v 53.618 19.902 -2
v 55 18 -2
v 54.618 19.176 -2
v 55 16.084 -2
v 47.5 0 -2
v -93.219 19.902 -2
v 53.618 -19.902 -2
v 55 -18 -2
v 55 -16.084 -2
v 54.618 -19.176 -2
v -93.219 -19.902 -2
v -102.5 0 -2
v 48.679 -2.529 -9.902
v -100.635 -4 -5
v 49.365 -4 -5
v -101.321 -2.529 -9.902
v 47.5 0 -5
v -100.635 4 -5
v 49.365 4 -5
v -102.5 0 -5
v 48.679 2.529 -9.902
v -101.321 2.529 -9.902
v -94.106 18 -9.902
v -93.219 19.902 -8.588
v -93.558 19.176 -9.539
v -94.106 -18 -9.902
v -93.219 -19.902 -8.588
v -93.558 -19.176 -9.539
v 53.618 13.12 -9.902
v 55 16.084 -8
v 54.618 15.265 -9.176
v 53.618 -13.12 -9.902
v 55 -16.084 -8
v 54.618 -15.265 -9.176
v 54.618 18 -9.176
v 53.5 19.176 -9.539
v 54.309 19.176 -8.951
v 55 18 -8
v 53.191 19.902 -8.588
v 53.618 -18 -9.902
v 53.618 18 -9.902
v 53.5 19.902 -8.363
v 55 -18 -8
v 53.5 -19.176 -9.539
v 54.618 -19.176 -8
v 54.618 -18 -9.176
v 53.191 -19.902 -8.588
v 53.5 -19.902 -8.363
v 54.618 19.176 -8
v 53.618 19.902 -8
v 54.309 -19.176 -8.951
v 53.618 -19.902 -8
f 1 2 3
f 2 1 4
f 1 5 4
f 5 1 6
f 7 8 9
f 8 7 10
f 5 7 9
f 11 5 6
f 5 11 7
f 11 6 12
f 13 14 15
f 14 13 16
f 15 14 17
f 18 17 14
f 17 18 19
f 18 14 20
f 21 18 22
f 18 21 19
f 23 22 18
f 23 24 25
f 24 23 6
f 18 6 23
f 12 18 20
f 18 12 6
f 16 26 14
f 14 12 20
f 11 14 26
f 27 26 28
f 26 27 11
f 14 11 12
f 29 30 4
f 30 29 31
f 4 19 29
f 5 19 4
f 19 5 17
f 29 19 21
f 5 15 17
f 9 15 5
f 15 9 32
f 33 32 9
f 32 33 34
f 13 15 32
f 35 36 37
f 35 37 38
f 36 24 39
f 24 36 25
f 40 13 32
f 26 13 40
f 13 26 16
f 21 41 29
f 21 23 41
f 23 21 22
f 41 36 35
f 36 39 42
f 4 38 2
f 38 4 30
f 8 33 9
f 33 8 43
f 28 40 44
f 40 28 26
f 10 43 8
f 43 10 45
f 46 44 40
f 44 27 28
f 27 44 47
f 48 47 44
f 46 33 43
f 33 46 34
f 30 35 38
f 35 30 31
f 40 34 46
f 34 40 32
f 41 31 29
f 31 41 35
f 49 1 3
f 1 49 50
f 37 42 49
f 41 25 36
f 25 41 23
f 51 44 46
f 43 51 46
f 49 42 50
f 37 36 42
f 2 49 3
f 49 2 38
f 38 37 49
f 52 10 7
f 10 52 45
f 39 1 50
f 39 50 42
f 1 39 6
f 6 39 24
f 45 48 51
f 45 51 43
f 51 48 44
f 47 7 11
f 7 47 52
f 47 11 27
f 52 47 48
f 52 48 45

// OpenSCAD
// file: globals.scad
/*
Most things in this file is represented as one millimeter, so keep that in mind while changing things.
Some of the setting are not mm but at variables that you can set, such as 2*x=2x and you are setting what x is.
I will try to specify when things are variables and not exact measurements.
*/

obj_leg = 30;
leg_length = 5.5;
small_number = 0.001;
metal_core_rode_global = 5;


///////////////// number of holes /////////////////////
z_hole_number = 8;
other_holes = 8;

///////////////// Pins /////////////////////

//pins that poke out
ball_size = 10;
pin_height = 20;
pin_diameter = 6;


//holes
hole_ball_size = ball_size;
hole_pin_height = pin_height;
hole_pin_diameter = pin_diameter;

///////////////// Z THINGS /////////////////////

berring_slot_width = 7.5;
berring_slot_depth = 6.5;
metal_core_rode = 5;

///////////////// X THINGS /////////////////////

//male dove tails
max_width=8;
min_width=5;
depth=5;
height=obj_leg/2;

//female dove tails, this is found on the y mounts
girl_max_width=11;
girl_min_width=5;
girl_depth=5;
girl_height=obj_leg;


///////////////// Y THINGS /////////////////////
/*
The Y is so normal that all of those global variables at the top should change all of the setting in it, this section is set her incase there are variables set in the future development of this project.
*/
// file: include.scad
//////////////////      END SECTION       //////////////////

	module added_pins(){
		difference(){
			union(){
				translate([30/(15/4),obj_leg*leg_length,30/(15/4)]) pin();
				translate([30/(15/4)+14.5,obj_leg*leg_length,30/(15/4)+14]) pin();
			}
			union(){
							translate([30/(15/4)+13.5,obj_leg*leg_length-20,30/(15/4)+5])cube(size=[2,40,15]);
							translate([30/(15/4)+7.5,obj_leg*leg_length-20,30/(15/4)+15])rotate([0,90,0]) cube(size=[2,40,15]);	

							translate([30/(15/4)-1,obj_leg*leg_length-20,30/(15/4)-8])cube(size=[2,40,15]);
							translate([30/(15/4)-10,obj_leg*leg_length-20,30/(15/4)+1])rotate([0,90,0]) cube(size=[2,40,15]);
			}
		}
	}
	module taken_pins() {
		translate([30/(15/4)+14,obj_leg*leg_length-10,30/(15/4)]) mirror_pin();
		translate([30/(15/4),obj_leg*leg_length-10,30/(15/4)+15]) mirror_pin();
	}


//////////////////      OTHER STUFF       //////////////////

	module holes() {
		rotate([0,0,90]) for(y=[0:other_holes])
		translate([obj_leg+y*15,-15.5,7.5]) union() {
			translate([7.5,0,15]) hole_up();
			hole_down();
		}
	}
	module extend_holes() {
	module top(){
		rotate([0,0,90]) for(y=[0:other_holes+1])
		translate([(30/4)+y*15,-15.5,7.5]) union() {
			translate([7.5,0,15]) hole_up();
		}
	}
	module bottom(){
		rotate([0,0,90]) for(y=[0:other_holes+2])
		translate([(30/4)+y*15,-15.5,7.5]) union() {
			hole_down();
		
}
	}
	union(){
		top();
		bottom();
	}
	}

	module hole() {
		union() {
			rotate([90, 90, 0]) cylinder(h=40, d=hole_pin_diameter, center=true);
			translate([0,7.5,0]) sphere(d=hole_ball_size);
			translate([0,-6,0]) sphere(d=hole_ball_size);
		}
	}
	module hole_up() {
		union() {
			rotate([90, 90, 0]) cylinder(h=40, d=hole_pin_diameter, center=true);
			translate([0,7.5,10]) cylinder(h=hole_pin_height, d=hole_pin_diameter, center=true);
			translate([0,-6,10]) cylinder(h=hole_pin_height, d=hole_pin_diameter, center=true);
			translate([0,7.5,0]) sphere(d=hole_ball_size);
			translate([0,-6,0]) sphere(d=hole_ball_size);
		}
	}
	module hole_down() {
		union() {
			rotate([90, 90, 0]) cylinder(h=40, d=hole_pin_diameter, center=true);
			translate([0,7.5,-10]) cylinder(h=hole_pin_height, d=hole_pin_diameter, center=true);
			translate([0,-6,-10]) cylinder(h=hole_pin_height, d=hole_pin_diameter, center=true);
			translate([0,7.5,0]) sphere(d=hole_ball_size);
			translate([0,-6,0]) sphere(d=hole_ball_size);
		}
	}
	module pin() {
		union() {
			rotate([90, 90, 0]) cylinder(h=pin_height, d=pin_diameter, center=true);
			translate([0,7.5,0]) sphere(d=ball_size);
		}
	}

	module mirror_pin() {
		rotate([90, 90, 0]) cylinder(h=hole_pin_height+small_number, d=hole_pin_diameter, center=true);
		translate([0,-(pin_height-(ball_size/2)),0]) sphere(d=ball_size);
	}


//////////////////      SOME RACK AND Z THINGS       //////////////////

module z_holes() {
    rotate([0,-90,0]) for(z=[0:z_hole_number])
    translate([22.5+z*15,16,-12])
        hole();
}

module pin_cuts() {
	union(){
		cube(size=[2,10,40], center=true);
		rotate([0,0,90]) cube(size=[2,10,40], center=true);
	}
}
module pin_uncut() {
	union(){
		rotate([0, 0, 90]) cylinder(h=hole_pin_height, d=hole_pin_diameter, center=true);
		translate([0,0,10]) sphere(d=ball_hole);
	}
}


module pin_out() {
	union(){
		rotate([0, 0, 90]) cylinder(h=pin_height, d=pin_diameter, center=true);
		translate([0,0,10]) sphere(d= ball_size);
	}
}


module pins_z(){
	difference() {
		pin_out();
		pin_cuts();
	}
}
//////////////////      RACK AND SLIDE     ///////////////////

module straight_pins() {
	for(z=[0:((((obj_leg*leg_length)*2)-(obj_leg*2))/3)/14.5]) rotate([-90,0,0]) translate([z*15,30/(15/4),14]) pins_z();
	for(z=[0:((((obj_leg*leg_length)*2)-(obj_leg*2))/3)/14.5]) rotate([-90,0,0]) translate([z*15,30/(15/4)-14,14]) pins_z();
}
module stagger_pins() {
	for(z=[0:((((obj_leg*leg_length)*2)-(obj_leg*2))/3)/14.5]) rotate([-90,0,0]) translate([z*15,30/(15/4),14]) pins_z();
	for(z=[0:((((obj_leg*leg_length)*2)-(obj_leg*2))/3)/14.5]) rotate([-90,0,0]) translate([z*15+7,30/(15/4)-14,14]) pins_z();
}


//////////////////      DOVE TAIL       //////////////////

module male_dovetail(height) {
	dovetail_3d(max_width,min_width,depth,height);
}

module dovetail_3d(max_width=11, min_width=5, depth=5, height=30) {
	linear_extrude(height=height, convexity=2)
		dovetail_2d(max_width,min_width,depth);
}

module dovetail_2d(max_width=11, min_width=5, depth=5) {
	angle=atan((max_width/2-min_width/2)/depth);
	echo("angle: ", angle);
	polygon(paths=[[0,1,2,3,0]], points=[[-min_width/2,0], [-max_width/2,depth], [max_width/2, depth], [min_width/2,0]]);
}

//bow tie
	module tie_end(height){
				rotate([0,0,0]) translate([0,-0.01,((obj_leg/2)/2)]) male_dovetail(height);
				rotate([0,90,0]) translate([0,-0.01,((obj_leg/2)/2)]) male_dovetail(height);
				rotate([0,180,0]) translate([0,-0.01,((obj_leg/2)/2)]) male_dovetail(height);
				rotate([0,-90,0]) translate([0,-0.01,((obj_leg/2)/2)]) male_dovetail(height);
	}

module bow_support(){
	difference(){
		intersection(){
			translate([-15,0,-15]) cube([30,9,30]);
			scale([1.05,1.05,1.05]) rotate([0,45,0]) tie_end();
		}
		cube([29.2,29.2,29.2], center=true);
	}
}

	module wrap(){
		depth = 30;
				translate([-15,30,15]) rotate([90,180,90]) male_dovetail(height=depth);
				rotate([0,90,0]) translate([-15,30,15]) rotate([90,180,90]) male_dovetail(height=depth);
				rotate([0,180,0]) translate([-15,30,15]) rotate([90,180,90]) male_dovetail(height=depth);
				rotate([0,-90,0]) translate([-15,30,15]) rotate([90,180,90]) male_dovetail(height=depth);
	}
// main file
include <include.scad>;
include <globals.scad>;


//globals

obj_height = 40;
units = 8; //only even numbers
tail_depth = 8;
tie_scale_x = 1;
tie_scale_y = 1;
tie_scale_z = 1;

resolution = 10;

//good things
module rounded_cube(width,depth,height){
    hull(){
        translate([width/2-diamiter/2,depth/2-diamiter/2,height/2-diamiter/2]) sphere(d=diamiter);
        translate([width/2-(diamiter/2),depth/2-(diamiter/2),-height/2+(diamiter/2)]) sphere(d=diamiter);
        translate([-width/2+diamiter/2,depth/2-diamiter/2,height/2-diamiter/2]) sphere(d=diamiter);
        translate([-width/2+(diamiter/2),depth/2-(diamiter/2),-height/2+(diamiter/2)]) sphere(d=diamiter);
        
        translate([width/2-diamiter/2,-depth/2+diamiter/2,height/2-diamiter/2]) sphere(d=diamiter);
        translate([width/2-(diamiter/2),-depth/2+(diamiter/2),-height/2+(diamiter/2)]) sphere(d=diamiter);
        translate([-width/2+diamiter/2,-depth/2+diamiter/2,height/2-diamiter/2]) sphere(d=diamiter);
        translate([-width/2+(diamiter/2),-depth/2+(diamiter/2),-height/2+(diamiter/2)]) sphere(d=diamiter);
    }
}  
				module tie_taken(){
					difference(){
							#translate([0,tail_depth,0]) rotate([0,90,180]) scale([tie_scale_x,tie_scale_z,tie_scale_y])  male_dovetail(height=30);
					}
				}




//herring bone style rack made from inkscape and OpenScad
module rackObject() {

module rackHalf(){
	intersection() {
		union() {
			rotate(a=[0,-25,0]) {
				linear_extrude(height = obj_height*5, center = true, convexity = 10)
			   	import (file = "rack.dxf", layer = "Layer_1");
			}
		}
			translate([0, 0, obj_height/4*-1]) cube(center = true, [31, 50, obj_height/2]);
	}
}				
module rackFull(){
	intersection() {
		union() {
			mirror([0,0,1]) rackHalf();
			rackHalf();
		}
		union() {
			cube(center = true, [20, 30, obj_height-8]);

		}
	}
}
		for(rack_length=[-units:5]){ 
				translate([rack_length*20,0,0]) rackFull();
		}
		for(rack_length=[-units:1]){ 
			difference(){
				translate([30*rack_length+15,6,0]) cube([30,8,40], center=true);
				//translate([30*rack_length+9,0,0]) tie_taken();
			}
		}
}
diamiter = 4;

  
intersection(){
//translate([0,0,-10]) cube([20,20,20]);
	intersection(){
					rotate([-90,0,0]) translate([-10-((units-2)*15),0,0]) translate([30,0,0]) rounded_cube(30*units+10,20,40,$fn=resolution);
	union(){ 
		rotate([-90,0,0]) intersection(){
			difference(){
				rackObject();
				for(rack_length=[-units:1]){ 
						translate([30*rack_length+30,2,0]) tie_taken();
				}
			}

			difference(){
				union(){
					translate([30,0,0]) rounded_cube(30*units,20,40,$fn=50);
					translate([-12.5-((units-2)*15),-5,0]) rotate([0,25,0]) cube([30,30,30]);
					mirror([0,0,1]) translate([-12.5-((units-2)*15),-5,0]) rotate([0,25,0]) cube([30,30,30]);
				}
				union(){
					translate([47.5,-5,0]) rotate([0,25,0]) cube([units*30,30,units*30]);
					mirror([0,0,1]) translate([47.5,-5,0]) rotate([0,25,0]) cube([units*30,30,units*30]);
				}
			}
	//intersection
	}
	//union
	}
	//intersection
	}
//intersection
}
